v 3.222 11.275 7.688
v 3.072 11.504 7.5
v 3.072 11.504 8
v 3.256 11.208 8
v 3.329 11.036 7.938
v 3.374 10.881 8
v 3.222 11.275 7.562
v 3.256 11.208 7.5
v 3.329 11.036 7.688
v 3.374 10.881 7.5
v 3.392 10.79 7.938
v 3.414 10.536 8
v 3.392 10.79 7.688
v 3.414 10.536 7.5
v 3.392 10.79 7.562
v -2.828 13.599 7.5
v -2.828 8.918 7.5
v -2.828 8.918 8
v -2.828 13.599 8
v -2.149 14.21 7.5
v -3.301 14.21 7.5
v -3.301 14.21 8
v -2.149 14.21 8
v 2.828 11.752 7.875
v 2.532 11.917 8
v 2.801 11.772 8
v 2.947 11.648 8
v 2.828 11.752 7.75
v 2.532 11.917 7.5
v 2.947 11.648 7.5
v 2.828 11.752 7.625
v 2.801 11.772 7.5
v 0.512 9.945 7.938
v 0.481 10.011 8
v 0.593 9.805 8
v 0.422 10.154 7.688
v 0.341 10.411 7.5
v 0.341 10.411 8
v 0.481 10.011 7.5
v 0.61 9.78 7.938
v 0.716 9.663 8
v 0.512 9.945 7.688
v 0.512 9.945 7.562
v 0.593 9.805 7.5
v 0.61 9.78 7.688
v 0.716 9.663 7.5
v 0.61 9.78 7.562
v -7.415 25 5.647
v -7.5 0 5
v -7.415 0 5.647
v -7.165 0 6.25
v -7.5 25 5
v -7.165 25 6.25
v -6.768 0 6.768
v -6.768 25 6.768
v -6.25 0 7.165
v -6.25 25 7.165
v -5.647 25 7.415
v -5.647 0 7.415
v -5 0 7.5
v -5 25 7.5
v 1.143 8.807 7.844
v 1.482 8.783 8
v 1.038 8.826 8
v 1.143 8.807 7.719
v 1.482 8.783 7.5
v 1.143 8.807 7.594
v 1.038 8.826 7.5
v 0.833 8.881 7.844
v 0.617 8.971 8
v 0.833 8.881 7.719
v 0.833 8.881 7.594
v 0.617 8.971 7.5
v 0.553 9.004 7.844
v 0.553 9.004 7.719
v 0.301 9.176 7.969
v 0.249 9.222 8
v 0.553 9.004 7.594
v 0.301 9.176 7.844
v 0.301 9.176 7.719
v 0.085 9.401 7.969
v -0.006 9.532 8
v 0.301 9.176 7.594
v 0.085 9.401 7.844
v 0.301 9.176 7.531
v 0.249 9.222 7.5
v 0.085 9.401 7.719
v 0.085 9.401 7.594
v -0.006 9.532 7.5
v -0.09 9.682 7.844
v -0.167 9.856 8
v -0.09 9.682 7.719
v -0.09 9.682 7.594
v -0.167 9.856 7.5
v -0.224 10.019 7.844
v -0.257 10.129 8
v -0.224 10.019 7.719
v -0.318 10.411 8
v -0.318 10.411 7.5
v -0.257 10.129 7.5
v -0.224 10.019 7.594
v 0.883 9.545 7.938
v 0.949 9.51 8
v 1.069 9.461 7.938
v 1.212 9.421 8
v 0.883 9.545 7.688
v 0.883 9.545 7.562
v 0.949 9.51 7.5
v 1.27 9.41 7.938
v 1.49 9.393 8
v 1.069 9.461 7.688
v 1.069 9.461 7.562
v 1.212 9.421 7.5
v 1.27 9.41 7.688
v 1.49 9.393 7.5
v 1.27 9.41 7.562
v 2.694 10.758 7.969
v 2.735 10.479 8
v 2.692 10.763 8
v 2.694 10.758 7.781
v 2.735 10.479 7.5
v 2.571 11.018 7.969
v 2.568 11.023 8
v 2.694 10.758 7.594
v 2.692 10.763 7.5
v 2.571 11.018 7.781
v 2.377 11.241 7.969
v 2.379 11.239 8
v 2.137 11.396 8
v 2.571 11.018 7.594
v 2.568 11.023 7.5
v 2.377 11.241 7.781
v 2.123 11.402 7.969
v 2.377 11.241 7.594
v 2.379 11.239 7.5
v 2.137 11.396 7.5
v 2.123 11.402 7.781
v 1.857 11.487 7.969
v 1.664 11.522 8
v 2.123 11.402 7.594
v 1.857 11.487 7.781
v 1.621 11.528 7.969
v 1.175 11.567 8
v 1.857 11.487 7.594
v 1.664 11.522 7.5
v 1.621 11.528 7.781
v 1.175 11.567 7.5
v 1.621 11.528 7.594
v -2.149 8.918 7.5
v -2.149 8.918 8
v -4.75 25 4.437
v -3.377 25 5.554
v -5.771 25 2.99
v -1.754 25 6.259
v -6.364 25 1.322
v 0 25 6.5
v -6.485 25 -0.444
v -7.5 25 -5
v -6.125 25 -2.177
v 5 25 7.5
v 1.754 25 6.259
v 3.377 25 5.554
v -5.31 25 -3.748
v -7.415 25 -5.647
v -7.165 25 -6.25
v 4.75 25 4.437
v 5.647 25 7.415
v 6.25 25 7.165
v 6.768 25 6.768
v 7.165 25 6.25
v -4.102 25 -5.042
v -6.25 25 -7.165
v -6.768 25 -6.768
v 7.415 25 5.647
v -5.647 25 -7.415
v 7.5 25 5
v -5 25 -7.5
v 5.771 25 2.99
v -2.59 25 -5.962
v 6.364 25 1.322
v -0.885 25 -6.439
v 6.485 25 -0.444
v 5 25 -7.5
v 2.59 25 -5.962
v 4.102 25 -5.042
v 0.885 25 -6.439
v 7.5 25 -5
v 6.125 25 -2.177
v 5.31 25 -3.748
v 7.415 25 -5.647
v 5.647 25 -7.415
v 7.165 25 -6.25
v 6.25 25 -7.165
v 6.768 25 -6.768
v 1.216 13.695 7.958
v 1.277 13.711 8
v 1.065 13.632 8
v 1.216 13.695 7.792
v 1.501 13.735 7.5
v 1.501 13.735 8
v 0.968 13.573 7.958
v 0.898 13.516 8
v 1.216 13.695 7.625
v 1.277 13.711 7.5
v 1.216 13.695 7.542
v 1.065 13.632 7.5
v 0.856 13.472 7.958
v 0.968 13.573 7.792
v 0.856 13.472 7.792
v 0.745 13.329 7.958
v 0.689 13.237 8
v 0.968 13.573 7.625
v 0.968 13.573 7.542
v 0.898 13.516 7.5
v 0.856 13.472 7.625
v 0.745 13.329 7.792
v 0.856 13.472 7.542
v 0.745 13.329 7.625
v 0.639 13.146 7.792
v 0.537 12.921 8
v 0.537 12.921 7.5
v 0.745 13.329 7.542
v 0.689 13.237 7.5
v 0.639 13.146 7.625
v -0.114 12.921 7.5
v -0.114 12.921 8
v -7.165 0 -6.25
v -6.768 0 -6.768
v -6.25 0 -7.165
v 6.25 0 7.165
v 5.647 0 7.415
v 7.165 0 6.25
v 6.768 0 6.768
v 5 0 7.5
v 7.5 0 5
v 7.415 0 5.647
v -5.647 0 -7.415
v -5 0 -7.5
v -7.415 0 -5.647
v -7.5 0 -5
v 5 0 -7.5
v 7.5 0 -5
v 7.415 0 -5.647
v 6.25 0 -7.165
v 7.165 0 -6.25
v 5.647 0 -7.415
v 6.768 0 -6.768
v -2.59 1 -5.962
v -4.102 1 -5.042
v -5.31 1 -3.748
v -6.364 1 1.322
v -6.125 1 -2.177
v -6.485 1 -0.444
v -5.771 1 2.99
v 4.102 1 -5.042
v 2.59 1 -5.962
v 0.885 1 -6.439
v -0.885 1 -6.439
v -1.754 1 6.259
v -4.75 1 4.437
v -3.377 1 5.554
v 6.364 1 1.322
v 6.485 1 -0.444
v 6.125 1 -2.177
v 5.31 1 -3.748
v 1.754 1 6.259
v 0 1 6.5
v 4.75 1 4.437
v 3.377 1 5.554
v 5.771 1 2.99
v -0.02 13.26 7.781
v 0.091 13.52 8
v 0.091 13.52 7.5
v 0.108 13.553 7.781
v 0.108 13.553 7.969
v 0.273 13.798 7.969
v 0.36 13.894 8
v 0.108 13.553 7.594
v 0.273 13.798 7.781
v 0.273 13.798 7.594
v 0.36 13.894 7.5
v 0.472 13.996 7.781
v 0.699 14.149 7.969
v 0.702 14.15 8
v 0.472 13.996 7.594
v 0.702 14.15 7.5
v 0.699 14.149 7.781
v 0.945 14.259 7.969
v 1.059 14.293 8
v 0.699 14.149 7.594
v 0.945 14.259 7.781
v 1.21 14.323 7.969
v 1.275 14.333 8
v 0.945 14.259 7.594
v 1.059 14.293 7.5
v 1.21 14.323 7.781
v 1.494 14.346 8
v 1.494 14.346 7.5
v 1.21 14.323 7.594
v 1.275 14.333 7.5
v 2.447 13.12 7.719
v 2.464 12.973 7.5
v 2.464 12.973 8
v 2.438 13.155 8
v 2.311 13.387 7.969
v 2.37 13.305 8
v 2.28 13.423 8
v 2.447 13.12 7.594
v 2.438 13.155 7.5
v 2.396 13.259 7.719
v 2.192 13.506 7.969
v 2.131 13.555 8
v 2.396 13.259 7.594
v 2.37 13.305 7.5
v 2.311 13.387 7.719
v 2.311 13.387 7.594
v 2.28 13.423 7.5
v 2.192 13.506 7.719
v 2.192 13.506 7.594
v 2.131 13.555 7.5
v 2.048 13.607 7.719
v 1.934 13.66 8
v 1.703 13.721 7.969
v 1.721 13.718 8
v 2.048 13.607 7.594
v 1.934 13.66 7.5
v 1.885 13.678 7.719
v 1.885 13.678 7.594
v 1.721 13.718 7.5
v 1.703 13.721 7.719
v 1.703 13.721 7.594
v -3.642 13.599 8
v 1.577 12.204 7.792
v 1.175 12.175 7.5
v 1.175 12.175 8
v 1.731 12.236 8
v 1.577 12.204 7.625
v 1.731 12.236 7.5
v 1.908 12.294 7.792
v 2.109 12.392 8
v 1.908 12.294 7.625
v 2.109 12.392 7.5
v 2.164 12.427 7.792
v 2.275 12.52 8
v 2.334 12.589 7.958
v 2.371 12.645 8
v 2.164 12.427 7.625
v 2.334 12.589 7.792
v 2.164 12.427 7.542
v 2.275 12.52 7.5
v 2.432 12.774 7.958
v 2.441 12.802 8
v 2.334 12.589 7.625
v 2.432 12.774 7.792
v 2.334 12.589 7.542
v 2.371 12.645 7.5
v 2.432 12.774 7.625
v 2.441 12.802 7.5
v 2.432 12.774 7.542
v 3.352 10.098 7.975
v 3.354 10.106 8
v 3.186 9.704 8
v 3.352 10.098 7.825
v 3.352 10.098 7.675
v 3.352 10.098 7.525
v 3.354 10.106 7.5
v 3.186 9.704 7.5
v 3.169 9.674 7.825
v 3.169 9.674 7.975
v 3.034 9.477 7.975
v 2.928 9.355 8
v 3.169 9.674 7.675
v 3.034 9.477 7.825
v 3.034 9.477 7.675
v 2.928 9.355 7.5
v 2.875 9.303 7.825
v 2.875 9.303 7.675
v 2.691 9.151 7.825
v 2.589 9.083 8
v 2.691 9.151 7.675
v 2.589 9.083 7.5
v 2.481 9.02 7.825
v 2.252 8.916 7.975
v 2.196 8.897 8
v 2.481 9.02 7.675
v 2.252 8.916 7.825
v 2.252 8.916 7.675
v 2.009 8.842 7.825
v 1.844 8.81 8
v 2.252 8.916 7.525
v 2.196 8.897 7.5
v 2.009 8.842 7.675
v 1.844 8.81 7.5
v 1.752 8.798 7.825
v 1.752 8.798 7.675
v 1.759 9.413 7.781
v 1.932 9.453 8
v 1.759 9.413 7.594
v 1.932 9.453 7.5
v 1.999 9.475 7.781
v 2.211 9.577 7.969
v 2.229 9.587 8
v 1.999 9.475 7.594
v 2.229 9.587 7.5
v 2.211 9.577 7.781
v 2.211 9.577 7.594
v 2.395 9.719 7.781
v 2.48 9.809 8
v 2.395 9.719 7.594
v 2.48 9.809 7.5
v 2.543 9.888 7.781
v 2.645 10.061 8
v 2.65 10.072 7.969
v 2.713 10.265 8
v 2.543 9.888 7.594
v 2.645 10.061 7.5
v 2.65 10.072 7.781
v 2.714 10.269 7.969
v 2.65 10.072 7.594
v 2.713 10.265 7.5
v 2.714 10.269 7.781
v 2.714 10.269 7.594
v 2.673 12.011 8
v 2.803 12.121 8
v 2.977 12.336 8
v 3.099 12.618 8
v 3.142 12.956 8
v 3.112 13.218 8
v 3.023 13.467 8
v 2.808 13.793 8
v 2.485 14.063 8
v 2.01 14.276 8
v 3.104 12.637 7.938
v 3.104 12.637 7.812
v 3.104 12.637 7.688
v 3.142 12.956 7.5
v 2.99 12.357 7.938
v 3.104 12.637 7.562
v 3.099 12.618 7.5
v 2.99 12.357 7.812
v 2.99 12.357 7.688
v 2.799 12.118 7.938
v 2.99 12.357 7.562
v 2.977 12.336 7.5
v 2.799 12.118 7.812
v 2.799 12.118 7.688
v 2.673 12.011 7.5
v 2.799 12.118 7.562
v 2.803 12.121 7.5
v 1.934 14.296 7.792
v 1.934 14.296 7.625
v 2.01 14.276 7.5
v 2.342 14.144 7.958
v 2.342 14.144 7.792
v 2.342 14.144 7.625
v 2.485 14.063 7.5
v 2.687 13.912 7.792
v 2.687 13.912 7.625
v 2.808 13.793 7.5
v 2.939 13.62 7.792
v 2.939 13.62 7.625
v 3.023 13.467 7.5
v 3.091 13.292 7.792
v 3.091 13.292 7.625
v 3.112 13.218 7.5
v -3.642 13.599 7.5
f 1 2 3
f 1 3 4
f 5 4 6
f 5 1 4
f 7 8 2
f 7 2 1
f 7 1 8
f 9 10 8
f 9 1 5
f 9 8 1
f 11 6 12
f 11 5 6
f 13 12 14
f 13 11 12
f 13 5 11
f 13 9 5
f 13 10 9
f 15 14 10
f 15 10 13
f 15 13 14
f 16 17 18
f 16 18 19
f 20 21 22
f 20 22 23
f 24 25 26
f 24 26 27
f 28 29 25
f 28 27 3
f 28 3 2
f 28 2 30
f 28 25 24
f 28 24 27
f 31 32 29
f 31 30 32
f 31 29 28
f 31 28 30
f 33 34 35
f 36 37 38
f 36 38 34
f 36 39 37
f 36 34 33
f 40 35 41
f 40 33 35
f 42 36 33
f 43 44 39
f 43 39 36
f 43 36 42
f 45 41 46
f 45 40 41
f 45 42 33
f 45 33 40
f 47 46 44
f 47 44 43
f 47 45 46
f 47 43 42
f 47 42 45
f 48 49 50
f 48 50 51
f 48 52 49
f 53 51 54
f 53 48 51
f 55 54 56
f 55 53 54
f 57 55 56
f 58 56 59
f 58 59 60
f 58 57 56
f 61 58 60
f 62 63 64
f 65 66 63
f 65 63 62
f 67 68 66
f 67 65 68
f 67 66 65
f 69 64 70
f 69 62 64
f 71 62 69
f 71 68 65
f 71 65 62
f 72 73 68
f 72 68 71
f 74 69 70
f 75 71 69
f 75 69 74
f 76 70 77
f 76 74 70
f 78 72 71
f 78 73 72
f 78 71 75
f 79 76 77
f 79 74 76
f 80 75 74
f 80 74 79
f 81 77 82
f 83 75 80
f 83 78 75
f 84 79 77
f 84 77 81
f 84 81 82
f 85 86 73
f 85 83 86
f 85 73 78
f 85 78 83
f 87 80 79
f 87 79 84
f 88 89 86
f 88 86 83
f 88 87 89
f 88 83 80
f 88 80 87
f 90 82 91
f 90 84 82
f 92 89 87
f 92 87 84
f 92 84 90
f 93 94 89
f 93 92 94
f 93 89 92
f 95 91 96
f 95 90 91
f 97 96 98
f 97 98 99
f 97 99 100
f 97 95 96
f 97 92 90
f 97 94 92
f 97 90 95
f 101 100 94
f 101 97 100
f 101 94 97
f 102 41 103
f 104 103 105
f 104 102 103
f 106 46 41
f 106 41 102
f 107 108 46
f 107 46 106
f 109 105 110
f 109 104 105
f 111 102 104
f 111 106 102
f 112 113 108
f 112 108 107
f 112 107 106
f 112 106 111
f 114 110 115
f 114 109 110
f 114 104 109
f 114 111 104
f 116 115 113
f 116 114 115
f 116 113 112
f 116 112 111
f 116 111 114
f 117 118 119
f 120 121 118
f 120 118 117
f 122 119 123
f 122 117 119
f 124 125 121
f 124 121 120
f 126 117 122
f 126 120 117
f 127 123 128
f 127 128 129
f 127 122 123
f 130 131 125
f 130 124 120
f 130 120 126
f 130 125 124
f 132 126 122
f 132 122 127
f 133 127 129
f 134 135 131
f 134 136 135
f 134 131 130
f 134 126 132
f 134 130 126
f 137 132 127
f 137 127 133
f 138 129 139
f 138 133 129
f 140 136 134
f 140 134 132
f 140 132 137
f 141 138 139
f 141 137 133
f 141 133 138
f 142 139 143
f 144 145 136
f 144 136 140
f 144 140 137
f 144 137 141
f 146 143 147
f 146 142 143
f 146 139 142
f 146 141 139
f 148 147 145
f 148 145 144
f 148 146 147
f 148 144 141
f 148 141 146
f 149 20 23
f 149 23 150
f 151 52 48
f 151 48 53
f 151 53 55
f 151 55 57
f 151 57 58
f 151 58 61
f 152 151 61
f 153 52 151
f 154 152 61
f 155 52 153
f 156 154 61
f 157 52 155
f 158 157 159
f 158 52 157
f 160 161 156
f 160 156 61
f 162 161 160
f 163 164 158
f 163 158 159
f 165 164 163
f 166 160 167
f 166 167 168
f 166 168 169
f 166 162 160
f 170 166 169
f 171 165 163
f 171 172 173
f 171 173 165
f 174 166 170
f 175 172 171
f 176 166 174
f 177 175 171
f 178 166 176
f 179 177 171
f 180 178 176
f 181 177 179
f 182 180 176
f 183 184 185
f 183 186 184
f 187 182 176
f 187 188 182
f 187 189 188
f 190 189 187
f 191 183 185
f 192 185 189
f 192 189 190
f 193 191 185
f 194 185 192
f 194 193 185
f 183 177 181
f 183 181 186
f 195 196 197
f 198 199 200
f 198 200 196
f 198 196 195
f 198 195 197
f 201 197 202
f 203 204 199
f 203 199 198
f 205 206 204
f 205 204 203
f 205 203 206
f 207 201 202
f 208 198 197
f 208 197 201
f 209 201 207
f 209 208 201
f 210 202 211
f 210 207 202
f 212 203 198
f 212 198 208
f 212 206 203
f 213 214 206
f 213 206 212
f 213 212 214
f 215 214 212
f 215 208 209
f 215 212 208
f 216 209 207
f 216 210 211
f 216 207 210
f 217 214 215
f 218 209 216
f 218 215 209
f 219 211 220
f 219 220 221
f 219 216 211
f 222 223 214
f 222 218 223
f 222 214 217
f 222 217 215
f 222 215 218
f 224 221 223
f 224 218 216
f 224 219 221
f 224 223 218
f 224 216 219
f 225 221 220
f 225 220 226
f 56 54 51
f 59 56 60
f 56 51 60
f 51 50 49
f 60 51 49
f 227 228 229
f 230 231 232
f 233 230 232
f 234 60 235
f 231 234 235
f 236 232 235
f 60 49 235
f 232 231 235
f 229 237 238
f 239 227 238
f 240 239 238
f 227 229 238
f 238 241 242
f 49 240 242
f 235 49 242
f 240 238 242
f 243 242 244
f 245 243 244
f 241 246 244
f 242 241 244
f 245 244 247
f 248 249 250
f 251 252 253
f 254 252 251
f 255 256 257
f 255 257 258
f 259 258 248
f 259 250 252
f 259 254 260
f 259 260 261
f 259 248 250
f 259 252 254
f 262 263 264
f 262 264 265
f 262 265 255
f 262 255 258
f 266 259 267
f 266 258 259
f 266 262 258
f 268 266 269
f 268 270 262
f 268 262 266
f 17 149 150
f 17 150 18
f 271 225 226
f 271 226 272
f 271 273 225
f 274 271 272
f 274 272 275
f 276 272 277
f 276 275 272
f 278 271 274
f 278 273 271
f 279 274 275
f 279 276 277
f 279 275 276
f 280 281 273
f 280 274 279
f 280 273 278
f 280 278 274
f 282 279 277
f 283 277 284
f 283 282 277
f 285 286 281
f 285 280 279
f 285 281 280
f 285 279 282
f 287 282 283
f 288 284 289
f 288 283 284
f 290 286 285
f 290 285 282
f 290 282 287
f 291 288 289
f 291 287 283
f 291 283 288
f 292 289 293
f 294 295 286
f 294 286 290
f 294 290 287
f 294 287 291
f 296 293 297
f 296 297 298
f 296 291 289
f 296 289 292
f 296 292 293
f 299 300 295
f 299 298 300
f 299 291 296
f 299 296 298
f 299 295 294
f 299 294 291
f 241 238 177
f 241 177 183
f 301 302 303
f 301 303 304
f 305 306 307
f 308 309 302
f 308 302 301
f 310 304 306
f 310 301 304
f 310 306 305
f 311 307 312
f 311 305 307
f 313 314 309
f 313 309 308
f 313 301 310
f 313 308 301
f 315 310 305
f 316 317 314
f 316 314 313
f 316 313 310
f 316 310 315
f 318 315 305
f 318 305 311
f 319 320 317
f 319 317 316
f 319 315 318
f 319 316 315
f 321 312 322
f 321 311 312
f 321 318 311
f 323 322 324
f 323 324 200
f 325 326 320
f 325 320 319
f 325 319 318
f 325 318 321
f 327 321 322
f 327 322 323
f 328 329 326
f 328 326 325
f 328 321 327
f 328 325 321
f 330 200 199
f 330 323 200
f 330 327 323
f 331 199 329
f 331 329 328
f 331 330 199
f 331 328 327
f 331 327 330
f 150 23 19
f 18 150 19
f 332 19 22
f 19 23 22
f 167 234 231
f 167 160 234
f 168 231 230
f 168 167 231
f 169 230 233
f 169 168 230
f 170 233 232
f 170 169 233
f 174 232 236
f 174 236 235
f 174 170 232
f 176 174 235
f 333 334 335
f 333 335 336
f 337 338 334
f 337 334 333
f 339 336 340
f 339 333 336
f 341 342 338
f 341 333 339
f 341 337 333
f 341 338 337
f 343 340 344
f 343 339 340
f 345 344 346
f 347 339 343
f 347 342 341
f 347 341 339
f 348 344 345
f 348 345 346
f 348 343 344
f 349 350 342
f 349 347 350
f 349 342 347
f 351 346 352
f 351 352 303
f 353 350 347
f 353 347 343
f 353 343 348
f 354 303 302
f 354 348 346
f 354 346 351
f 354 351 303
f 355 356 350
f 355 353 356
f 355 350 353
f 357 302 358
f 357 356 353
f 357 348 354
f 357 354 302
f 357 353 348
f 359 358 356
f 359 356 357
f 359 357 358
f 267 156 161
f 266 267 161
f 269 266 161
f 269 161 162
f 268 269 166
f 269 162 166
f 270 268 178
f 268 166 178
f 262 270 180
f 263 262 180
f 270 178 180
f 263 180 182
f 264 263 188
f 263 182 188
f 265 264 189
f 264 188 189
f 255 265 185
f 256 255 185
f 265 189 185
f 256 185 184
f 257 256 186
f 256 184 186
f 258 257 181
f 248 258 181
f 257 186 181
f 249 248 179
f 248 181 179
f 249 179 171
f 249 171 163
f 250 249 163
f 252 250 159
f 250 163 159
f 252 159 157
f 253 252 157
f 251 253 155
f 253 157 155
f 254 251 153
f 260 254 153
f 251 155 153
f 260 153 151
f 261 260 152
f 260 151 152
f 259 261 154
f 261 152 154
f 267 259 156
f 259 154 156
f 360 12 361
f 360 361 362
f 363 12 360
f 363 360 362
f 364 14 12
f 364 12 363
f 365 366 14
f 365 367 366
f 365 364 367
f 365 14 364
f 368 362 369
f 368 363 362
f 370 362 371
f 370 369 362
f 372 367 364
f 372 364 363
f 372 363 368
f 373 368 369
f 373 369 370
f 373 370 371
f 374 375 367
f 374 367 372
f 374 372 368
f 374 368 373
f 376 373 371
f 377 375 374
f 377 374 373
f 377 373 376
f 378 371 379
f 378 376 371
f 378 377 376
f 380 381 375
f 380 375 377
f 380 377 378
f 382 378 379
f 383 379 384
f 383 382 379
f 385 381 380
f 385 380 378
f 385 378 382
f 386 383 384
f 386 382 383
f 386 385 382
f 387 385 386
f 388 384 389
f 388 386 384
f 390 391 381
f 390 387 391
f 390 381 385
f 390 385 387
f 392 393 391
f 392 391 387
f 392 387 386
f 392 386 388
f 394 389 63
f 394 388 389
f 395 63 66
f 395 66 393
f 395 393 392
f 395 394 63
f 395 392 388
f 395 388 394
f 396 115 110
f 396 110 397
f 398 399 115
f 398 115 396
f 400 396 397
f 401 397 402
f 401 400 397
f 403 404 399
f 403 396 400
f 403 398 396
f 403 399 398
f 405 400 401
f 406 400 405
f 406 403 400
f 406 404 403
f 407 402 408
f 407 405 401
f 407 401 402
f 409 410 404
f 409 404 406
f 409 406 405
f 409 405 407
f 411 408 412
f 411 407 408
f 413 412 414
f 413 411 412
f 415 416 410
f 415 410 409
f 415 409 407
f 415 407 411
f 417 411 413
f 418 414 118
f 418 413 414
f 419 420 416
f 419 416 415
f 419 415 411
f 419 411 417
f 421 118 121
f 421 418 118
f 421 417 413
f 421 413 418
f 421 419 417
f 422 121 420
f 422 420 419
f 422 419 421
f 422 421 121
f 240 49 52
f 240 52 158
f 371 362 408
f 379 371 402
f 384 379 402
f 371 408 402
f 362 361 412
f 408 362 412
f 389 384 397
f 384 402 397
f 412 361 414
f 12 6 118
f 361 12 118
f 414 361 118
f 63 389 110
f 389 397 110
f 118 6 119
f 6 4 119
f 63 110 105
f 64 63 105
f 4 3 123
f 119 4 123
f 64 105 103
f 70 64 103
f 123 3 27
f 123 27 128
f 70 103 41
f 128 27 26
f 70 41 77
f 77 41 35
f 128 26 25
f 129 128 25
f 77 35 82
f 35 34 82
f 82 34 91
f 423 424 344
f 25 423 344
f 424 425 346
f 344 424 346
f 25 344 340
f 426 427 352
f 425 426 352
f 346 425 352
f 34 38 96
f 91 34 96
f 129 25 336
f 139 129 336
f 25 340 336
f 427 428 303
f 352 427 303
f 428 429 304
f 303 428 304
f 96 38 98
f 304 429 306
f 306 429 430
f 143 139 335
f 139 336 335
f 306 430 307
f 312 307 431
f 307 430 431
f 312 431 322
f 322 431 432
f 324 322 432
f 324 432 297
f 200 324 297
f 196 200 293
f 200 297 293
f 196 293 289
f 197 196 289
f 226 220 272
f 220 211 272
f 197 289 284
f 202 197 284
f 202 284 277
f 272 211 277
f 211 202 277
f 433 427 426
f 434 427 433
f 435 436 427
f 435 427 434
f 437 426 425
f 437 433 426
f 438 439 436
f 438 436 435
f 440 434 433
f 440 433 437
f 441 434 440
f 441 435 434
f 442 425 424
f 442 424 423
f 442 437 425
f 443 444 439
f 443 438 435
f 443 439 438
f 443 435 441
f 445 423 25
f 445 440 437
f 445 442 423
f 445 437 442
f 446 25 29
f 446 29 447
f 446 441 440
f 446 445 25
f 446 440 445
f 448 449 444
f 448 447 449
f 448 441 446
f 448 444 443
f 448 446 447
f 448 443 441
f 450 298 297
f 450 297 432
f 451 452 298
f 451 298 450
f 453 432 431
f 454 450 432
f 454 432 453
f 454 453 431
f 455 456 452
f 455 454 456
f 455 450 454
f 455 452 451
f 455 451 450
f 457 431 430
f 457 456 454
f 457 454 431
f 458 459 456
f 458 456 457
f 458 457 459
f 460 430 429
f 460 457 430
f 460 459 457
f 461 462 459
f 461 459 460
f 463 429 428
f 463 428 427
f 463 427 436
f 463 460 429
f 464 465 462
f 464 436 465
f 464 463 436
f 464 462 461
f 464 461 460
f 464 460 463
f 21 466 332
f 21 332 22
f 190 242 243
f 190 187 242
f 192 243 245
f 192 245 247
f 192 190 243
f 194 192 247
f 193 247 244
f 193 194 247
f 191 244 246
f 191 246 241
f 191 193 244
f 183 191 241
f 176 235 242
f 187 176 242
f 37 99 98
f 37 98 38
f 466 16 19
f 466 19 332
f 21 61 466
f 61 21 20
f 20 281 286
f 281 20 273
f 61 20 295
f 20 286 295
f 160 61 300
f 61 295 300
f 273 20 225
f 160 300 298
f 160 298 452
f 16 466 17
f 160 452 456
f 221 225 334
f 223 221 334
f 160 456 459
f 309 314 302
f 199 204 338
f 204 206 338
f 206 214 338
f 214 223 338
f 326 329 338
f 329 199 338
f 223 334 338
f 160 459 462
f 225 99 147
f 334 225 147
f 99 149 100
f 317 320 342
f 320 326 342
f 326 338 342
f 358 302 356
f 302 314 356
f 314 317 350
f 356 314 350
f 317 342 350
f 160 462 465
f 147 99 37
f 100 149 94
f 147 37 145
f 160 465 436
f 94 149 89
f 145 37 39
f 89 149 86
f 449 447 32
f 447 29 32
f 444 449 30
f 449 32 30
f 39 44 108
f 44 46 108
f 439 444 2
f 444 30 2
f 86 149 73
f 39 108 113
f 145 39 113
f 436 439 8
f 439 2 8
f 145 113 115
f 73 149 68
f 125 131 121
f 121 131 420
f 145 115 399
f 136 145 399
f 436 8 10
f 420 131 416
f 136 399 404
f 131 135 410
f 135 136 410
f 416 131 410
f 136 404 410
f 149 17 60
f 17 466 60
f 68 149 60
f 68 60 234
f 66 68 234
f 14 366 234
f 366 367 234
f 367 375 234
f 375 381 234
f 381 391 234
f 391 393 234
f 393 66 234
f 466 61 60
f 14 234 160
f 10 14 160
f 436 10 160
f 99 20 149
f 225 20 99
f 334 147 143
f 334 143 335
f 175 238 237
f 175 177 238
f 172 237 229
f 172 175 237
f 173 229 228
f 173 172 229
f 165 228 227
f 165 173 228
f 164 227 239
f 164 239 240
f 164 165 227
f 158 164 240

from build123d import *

# Parameters (mm, degrees)
SKETCH1_W           = 15
SKETCH1_H           = 15
BOSS_EXTRUDE1_DEPTH = 25
SKETCH2_R           = 6.5
CUT_EXTRUDE1_DEPTH  = 24
BOSS_EXTRUDE3_DEPTH = 0.5
FILLET1_R           = 2.5
FILLET2_R           = 2.5
FILLET3_R           = 2.5
FILLET4_R           = 2.5


with BuildPart() as part:
    # Sketch1 → Boss-Extrude1 (new body)
    with BuildSketch(Plane(origin=(0, 0, 0), x_dir=(1, 0, 0), z_dir=(0, 1, 0))):
        Rectangle(SKETCH1_W, SKETCH1_H)
    extrude(amount=BOSS_EXTRUDE1_DEPTH)

    # Sketch2 → Cut-Extrude1 (cut)
    with BuildSketch(Plane(origin=(0, 25, 0), x_dir=(1, 0, 0), z_dir=(0, 1, 0))):
        with Locations(Location((0, 0, 0), (0, 0, 270))):
            Circle(SKETCH2_R)
    extrude(amount=-CUT_EXTRUDE1_DEPTH, mode=Mode.SUBTRACT)

    # Sketch3 → Boss-Extrude3 (add)
    with BuildSketch(Plane.XY.offset(7.5)):
        Polygon((-3.300679086, 14.210073329), (-2.149487179, 14.210073329), (-2.149487179, 8.918406662), (-2.827905982, 8.918406662), (-2.827905982, 13.599496406), (-3.642008546, 13.599496406), align=None)
        with BuildLine():
            Line((0.536627271, 12.921077603), (-0.114230768, 12.921077603))
            add(Edge.make_bspline(
                [(-0.114230768, 12.921077603), (-0.100961493, 12.97960801), (-0.074987112, 13.094180286), (-0.022481053, 13.257850992), (0.036681085, 13.410915565), (0.105032166, 13.552204246), (0.18423708, 13.680615371), (0.269979947, 13.798627118), (0.365943067, 13.903778446), (0.470019389, 13.997523947), (0.581683486, 14.078506256), (0.697631037, 14.150346176), (0.818785512, 14.210579109), (0.944384477, 14.26104525), (1.07507306, 14.299243023), (1.210742775, 14.325043417), (1.350596953, 14.343167819), (1.445719829, 14.344887341), (1.493833802, 14.34575709)],
                knots=[0, 0, 0, 0, 1.225194122, 2.398296627, 3.506547767, 4.574817873, 5.598350885, 6.584148364, 7.54966307, 8.500147383, 9.439776218, 10.36307994, 11.282851771, 12.199447467, 13.124300948, 14.058371117, 15.017907346, 16, 16, 16, 16], degree=3))
            add(Edge.make_bspline(
                [(1.493833802, 14.34575709), (1.568531598, 14.343241617), (1.716386062, 14.338262569), (1.934195583, 14.30064004), (2.143451442, 14.236059647), (2.342206832, 14.148760529), (2.525877316, 14.041870431), (2.688320429, 13.917169074), (2.828024385, 13.777755988), (2.940950824, 13.623466287), (3.030374612, 13.461564399), (3.094266969, 13.295358681), (3.134897281, 13.126546953), (3.139755234, 13.012814321), (3.142179488, 12.956058572)],
                knots=[0, 0, 0, 0, 1.126551995, 2.229861531, 3.322496069, 4.422827045, 5.497949776, 6.520418829, 7.504194933, 8.464779191, 9.395175895, 10.286118409, 11.144725379, 12, 12, 12, 12], degree=3))
            add(Edge.make_bspline(
                [(3.142179488, 12.956058572), (3.140445745, 12.901156816), (3.137054029, 12.793752712), (3.107562398, 12.637619364), (3.060141337, 12.491151022), (2.992304739, 12.354955699), (2.905853989, 12.228760675), (2.799194916, 12.113655832), (2.674433691, 12.007543566), (2.580108351, 11.947900553), (2.531602565, 11.917229779)],
                knots=[0, 0, 0, 0, 1.039530957, 2.033630564, 2.999111873, 3.948297759, 4.906578666, 5.887513816, 6.913676835, 8, 8, 8, 8], degree=3))
            add(Edge.make_bspline(
                [(2.531602565, 11.917229779), (2.584015029, 11.894773533), (2.688596929, 11.849965164), (2.830947045, 11.754438191), (2.961806101, 11.640433311), (3.034980771, 11.549892367), (3.072217549, 11.503818321)],
                knots=[0, 0, 0, 0, 0.990740455, 1.976887035, 2.970487876, 4, 4, 4, 4], degree=3))
            add(Edge.make_bspline(
                [(3.072217549, 11.503818321), (3.099199896, 11.466345), (3.152494918, 11.392328407), (3.223193721, 11.27672227), (3.280661614, 11.15750979), (3.330599467, 11.03769875), (3.36747824, 10.915047449), (3.394052073, 10.790627171), (3.410528936, 10.664010495), (3.412537758, 10.578814684), (3.413547009, 10.536011497)],
                knots=[0, 0, 0, 0, 1.060434252, 2.094549648, 3.107169572, 4.097295716, 5.072846837, 6.043796276, 7.017184609, 8, 8, 8, 8], degree=3))
            add(Edge.make_bspline(
                [(3.413547009, 10.536011497), (3.410884478, 10.462255283), (3.405544113, 10.314318949), (3.355756698, 10.095274277), (3.279517444, 9.87949602), (3.190263242, 9.706554209), (3.106229875, 9.572451392), (3.035363238, 9.476738788), (2.959072469, 9.385890858), (2.875352239, 9.302061826), (2.786861322, 9.222237669), (2.690771017, 9.149101484), (2.588777456, 9.08119272), (2.481373466, 9.018753249), (2.368425447, 8.963923848), (2.25238329, 8.914613155), (2.131846342, 8.875070384), (2.009065285, 8.840230397), (1.881992689, 8.815601905), (1.751948266, 8.795813187), (1.618014874, 8.78571627), (1.527767864, 8.783727609), (1.482173479, 8.782722902)],
                knots=[0, 0, 0, 0, 1.521749033, 3.052244174, 4.617626532, 6.240122497, 7.060311358, 7.885196768, 8.698339091, 9.508724546, 10.330730427, 11.158549718, 12.000758621, 12.860902525, 13.722748307, 14.593084173, 15.463328201, 16.341708233, 17.227848997, 18.135261118, 19.057900949, 20, 20, 20, 20], degree=3))
            add(Edge.make_bspline(
                [(1.482173479, 8.782722902), (1.424534496, 8.784009629), (1.311091495, 8.786542119), (1.144761754, 8.80453533), (0.985505782, 8.835279516), (0.833832902, 8.878940615), (0.688754462, 8.933826723), (0.551698785, 9.002209379), (0.421541769, 9.081928184), (0.298933599, 9.17442013), (0.185538343, 9.280567865), (0.081506968, 9.400204964), (-0.010374271, 9.534920483), (-0.093429441, 9.682647813), (-0.165387817, 9.845073744), (-0.2274602, 10.020890903), (-0.280102876, 10.210673196), (-0.304959207, 10.342867972), (-0.317756409, 10.41092803)],
                knots=[0, 0, 0, 0, 1.031951552, 2.031050468, 2.99141865, 3.932589319, 4.853771667, 5.764839348, 6.670884665, 7.583203617, 8.509779947, 9.447179227, 10.415909331, 11.424319639, 12.477825485, 13.592421652, 14.760465984, 16, 16, 16, 16], degree=3))
            Line((-0.317756409, 10.41092803), (0.340521836, 10.41092803))
            add(Edge.make_bspline(
                [(0.340521836, 10.41092803), (0.353642264, 10.365961117), (0.378781523, 10.27980274), (0.419994104, 10.156753231), (0.464328654, 10.046178878), (0.510010421, 9.946594394), (0.557269249, 9.858400707), (0.607129332, 9.781740097), (0.658566183, 9.715895757), (0.697291944, 9.679781396), (0.715772237, 9.662547287)],
                knots=[0, 0, 0, 0, 1.326285875, 2.54121601, 3.672658499, 4.697761427, 5.642367002, 6.502616728, 7.285434817, 8, 8, 8, 8], degree=3))
            add(Edge.make_bspline(
                [(0.715772237, 9.662547287), (0.742522938, 9.640711231), (0.795504144, 9.597463744), (0.882749756, 9.543986167), (0.972720363, 9.496111587), (1.068630016, 9.460087268), (1.167568548, 9.429638048), (1.271216907, 9.408640374), (1.37901821, 9.395682345), (1.452455657, 9.394100021), (1.489593684, 9.393299825)],
                knots=[0, 0, 0, 0, 0.989076215, 1.958918776, 2.928708407, 3.907140108, 4.891221483, 5.894723991, 6.935341563, 8, 8, 8, 8], degree=3))
            add(Edge.make_bspline(
                [(1.489593684, 9.393299825), (1.535564055, 9.394385116), (1.625629073, 9.396511414), (1.756948364, 9.411119566), (1.881465881, 9.436816065), (1.998634057, 9.472540053), (2.109229372, 9.518420277), (2.212093691, 9.574823167), (2.308446041, 9.640715678), (2.395915, 9.717176651), (2.474283993, 9.800159305), (2.544168737, 9.886739881), (2.603887301, 9.976492114), (2.651728418, 10.070571325), (2.689422936, 10.167818589), (2.715520817, 10.268504187), (2.732250533, 10.372562903), (2.734159496, 10.443017471), (2.735128206, 10.47876991)],
                knots=[0, 0, 0, 0, 1.196856166, 2.344877135, 3.434653565, 4.502660904, 5.529498559, 6.546397239, 7.551828815, 8.562675341, 9.564818567, 10.520268272, 11.456705045, 12.365995596, 13.262962725, 14.166698094, 15.069683942, 16, 16, 16, 16], degree=3))
            add(Edge.make_bspline(
                [(2.735128206, 10.47876991), (2.733019747, 10.525931359), (2.728805675, 10.620190586), (2.696820658, 10.758793296), (2.645521251, 10.893210689), (2.573056785, 11.020296841), (2.484855208, 11.139353782), (2.379063635, 11.243639788), (2.258444845, 11.332741278), (2.145936485, 11.394343128), (2.04399224, 11.435052667), (1.955096408, 11.463378228), (1.854145901, 11.488537229), (1.741612839, 11.510578276), (1.61711797, 11.529541882), (1.480621111, 11.545196857), (1.331763956, 11.55768696), (1.228486925, 11.5640896), (1.174764958, 11.567420084)],
                knots=[0, 0, 0, 0, 1.058801672, 2.116173898, 3.179133807, 4.280986043, 5.392377071, 6.498225676, 7.604871823, 8.752253925, 9.368447799, 10.068883315, 10.846735517, 11.704571958, 12.644304815, 13.675272135, 14.790738352, 16, 16, 16, 16], degree=3))
            Line((1.174764958, 11.567420084), (1.174764958, 12.174816919))
            add(Edge.make_bspline(
                [(1.174764958, 12.174816919), (1.244792803, 12.176105368), (1.379225183, 12.178578803), (1.572223534, 12.201059455), (1.747870691, 12.237255938), (1.905314059, 12.288971698), (2.042647935, 12.35297773), (2.161778734, 12.421655594), (2.259068443, 12.499974424), (2.335704951, 12.585390944), (2.392038085, 12.677435042), (2.43474333, 12.771757648), (2.458395507, 12.871531566), (2.461961466, 12.938985103), (2.463760685, 12.973019042)],
                knots=[0, 0, 0, 0, 1.49683591, 2.87347434, 4.147795521, 5.325633569, 6.407353164, 7.383009189, 8.25851615, 9.066624807, 9.823413814, 10.557538392, 11.272200497, 12, 12, 12, 12], degree=3))
            add(Edge.make_bspline(
                [(2.463760685, 12.973019042), (2.462989319, 12.998165871), (2.461468952, 13.047730405), (2.447975215, 13.120981745), (2.427069851, 13.191877769), (2.3971723, 13.260279908), (2.358008252, 13.325569974), (2.311713599, 13.389235409), (2.255758848, 13.449820095), (2.192602073, 13.507555086), (2.123479924, 13.561310327), (2.048694297, 13.608437464), (1.969006195, 13.647585237), (1.884409587, 13.67941094), (1.795493257, 13.704957023), (1.701488974, 13.722876037), (1.602919685, 13.73365892), (1.535556151, 13.734666896), (1.501254007, 13.735180167)],
                knots=[0, 0, 0, 0, 0.88508993, 1.744517034, 2.61478088, 3.484243336, 4.365825862, 5.291885516, 6.252189795, 7.265246754, 8.303377192, 9.332440159, 10.373327524, 11.425096702, 12.51242353, 13.62794981, 14.792129802, 16, 16, 16, 16], degree=3))
            add(Edge.make_bspline(
                [(1.501254007, 13.735180167), (1.451999534, 13.733049362), (1.355744815, 13.728885274), (1.215849293, 13.698979708), (1.08596836, 13.646935622), (0.984693576, 13.587633927), (0.908608791, 13.527502106), (0.852738473, 13.471044634), (0.798434832, 13.40397858), (0.743075275, 13.32807166), (0.689987439, 13.24084643), (0.637503486, 13.143811145), (0.585220048, 13.036405205), (0.553221665, 12.960461885), (0.536627271, 12.921077603)],
                knots=[0, 0, 0, 0, 1.30644707, 2.553102055, 3.773430717, 5.004978473, 5.652102429, 6.34150733, 7.107309491, 7.939915375, 8.832283585, 9.813897121, 10.866284818, 12, 12, 12, 12], degree=3))
        make_face()
    extrude(amount=BOSS_EXTRUDE3_DEPTH)

    # Fillet1
    fillet1_edges = [part.edges().sort_by_distance(p)[0] for p in [
        (-7.5, 12.5, 7.5),
    ]]
    fillet(fillet1_edges, radius=FILLET1_R)

    # Fillet2
    fillet2_edges = [part.edges().sort_by_distance(p)[0] for p in [
        (7.5, 12.5, 7.5),
    ]]
    fillet(fillet2_edges, radius=FILLET2_R)

    # Fillet3
    fillet3_edges = [part.edges().sort_by_distance(p)[0] for p in [
        (7.5, 12.5, -7.5),
    ]]
    fillet(fillet3_edges, radius=FILLET3_R)

    # Fillet4
    fillet4_edges = [part.edges().sort_by_distance(p)[0] for p in [
        (-7.5, 12.5, -7.5),
    ]]
    fillet(fillet4_edges, radius=FILLET4_R)


solid = part.part
